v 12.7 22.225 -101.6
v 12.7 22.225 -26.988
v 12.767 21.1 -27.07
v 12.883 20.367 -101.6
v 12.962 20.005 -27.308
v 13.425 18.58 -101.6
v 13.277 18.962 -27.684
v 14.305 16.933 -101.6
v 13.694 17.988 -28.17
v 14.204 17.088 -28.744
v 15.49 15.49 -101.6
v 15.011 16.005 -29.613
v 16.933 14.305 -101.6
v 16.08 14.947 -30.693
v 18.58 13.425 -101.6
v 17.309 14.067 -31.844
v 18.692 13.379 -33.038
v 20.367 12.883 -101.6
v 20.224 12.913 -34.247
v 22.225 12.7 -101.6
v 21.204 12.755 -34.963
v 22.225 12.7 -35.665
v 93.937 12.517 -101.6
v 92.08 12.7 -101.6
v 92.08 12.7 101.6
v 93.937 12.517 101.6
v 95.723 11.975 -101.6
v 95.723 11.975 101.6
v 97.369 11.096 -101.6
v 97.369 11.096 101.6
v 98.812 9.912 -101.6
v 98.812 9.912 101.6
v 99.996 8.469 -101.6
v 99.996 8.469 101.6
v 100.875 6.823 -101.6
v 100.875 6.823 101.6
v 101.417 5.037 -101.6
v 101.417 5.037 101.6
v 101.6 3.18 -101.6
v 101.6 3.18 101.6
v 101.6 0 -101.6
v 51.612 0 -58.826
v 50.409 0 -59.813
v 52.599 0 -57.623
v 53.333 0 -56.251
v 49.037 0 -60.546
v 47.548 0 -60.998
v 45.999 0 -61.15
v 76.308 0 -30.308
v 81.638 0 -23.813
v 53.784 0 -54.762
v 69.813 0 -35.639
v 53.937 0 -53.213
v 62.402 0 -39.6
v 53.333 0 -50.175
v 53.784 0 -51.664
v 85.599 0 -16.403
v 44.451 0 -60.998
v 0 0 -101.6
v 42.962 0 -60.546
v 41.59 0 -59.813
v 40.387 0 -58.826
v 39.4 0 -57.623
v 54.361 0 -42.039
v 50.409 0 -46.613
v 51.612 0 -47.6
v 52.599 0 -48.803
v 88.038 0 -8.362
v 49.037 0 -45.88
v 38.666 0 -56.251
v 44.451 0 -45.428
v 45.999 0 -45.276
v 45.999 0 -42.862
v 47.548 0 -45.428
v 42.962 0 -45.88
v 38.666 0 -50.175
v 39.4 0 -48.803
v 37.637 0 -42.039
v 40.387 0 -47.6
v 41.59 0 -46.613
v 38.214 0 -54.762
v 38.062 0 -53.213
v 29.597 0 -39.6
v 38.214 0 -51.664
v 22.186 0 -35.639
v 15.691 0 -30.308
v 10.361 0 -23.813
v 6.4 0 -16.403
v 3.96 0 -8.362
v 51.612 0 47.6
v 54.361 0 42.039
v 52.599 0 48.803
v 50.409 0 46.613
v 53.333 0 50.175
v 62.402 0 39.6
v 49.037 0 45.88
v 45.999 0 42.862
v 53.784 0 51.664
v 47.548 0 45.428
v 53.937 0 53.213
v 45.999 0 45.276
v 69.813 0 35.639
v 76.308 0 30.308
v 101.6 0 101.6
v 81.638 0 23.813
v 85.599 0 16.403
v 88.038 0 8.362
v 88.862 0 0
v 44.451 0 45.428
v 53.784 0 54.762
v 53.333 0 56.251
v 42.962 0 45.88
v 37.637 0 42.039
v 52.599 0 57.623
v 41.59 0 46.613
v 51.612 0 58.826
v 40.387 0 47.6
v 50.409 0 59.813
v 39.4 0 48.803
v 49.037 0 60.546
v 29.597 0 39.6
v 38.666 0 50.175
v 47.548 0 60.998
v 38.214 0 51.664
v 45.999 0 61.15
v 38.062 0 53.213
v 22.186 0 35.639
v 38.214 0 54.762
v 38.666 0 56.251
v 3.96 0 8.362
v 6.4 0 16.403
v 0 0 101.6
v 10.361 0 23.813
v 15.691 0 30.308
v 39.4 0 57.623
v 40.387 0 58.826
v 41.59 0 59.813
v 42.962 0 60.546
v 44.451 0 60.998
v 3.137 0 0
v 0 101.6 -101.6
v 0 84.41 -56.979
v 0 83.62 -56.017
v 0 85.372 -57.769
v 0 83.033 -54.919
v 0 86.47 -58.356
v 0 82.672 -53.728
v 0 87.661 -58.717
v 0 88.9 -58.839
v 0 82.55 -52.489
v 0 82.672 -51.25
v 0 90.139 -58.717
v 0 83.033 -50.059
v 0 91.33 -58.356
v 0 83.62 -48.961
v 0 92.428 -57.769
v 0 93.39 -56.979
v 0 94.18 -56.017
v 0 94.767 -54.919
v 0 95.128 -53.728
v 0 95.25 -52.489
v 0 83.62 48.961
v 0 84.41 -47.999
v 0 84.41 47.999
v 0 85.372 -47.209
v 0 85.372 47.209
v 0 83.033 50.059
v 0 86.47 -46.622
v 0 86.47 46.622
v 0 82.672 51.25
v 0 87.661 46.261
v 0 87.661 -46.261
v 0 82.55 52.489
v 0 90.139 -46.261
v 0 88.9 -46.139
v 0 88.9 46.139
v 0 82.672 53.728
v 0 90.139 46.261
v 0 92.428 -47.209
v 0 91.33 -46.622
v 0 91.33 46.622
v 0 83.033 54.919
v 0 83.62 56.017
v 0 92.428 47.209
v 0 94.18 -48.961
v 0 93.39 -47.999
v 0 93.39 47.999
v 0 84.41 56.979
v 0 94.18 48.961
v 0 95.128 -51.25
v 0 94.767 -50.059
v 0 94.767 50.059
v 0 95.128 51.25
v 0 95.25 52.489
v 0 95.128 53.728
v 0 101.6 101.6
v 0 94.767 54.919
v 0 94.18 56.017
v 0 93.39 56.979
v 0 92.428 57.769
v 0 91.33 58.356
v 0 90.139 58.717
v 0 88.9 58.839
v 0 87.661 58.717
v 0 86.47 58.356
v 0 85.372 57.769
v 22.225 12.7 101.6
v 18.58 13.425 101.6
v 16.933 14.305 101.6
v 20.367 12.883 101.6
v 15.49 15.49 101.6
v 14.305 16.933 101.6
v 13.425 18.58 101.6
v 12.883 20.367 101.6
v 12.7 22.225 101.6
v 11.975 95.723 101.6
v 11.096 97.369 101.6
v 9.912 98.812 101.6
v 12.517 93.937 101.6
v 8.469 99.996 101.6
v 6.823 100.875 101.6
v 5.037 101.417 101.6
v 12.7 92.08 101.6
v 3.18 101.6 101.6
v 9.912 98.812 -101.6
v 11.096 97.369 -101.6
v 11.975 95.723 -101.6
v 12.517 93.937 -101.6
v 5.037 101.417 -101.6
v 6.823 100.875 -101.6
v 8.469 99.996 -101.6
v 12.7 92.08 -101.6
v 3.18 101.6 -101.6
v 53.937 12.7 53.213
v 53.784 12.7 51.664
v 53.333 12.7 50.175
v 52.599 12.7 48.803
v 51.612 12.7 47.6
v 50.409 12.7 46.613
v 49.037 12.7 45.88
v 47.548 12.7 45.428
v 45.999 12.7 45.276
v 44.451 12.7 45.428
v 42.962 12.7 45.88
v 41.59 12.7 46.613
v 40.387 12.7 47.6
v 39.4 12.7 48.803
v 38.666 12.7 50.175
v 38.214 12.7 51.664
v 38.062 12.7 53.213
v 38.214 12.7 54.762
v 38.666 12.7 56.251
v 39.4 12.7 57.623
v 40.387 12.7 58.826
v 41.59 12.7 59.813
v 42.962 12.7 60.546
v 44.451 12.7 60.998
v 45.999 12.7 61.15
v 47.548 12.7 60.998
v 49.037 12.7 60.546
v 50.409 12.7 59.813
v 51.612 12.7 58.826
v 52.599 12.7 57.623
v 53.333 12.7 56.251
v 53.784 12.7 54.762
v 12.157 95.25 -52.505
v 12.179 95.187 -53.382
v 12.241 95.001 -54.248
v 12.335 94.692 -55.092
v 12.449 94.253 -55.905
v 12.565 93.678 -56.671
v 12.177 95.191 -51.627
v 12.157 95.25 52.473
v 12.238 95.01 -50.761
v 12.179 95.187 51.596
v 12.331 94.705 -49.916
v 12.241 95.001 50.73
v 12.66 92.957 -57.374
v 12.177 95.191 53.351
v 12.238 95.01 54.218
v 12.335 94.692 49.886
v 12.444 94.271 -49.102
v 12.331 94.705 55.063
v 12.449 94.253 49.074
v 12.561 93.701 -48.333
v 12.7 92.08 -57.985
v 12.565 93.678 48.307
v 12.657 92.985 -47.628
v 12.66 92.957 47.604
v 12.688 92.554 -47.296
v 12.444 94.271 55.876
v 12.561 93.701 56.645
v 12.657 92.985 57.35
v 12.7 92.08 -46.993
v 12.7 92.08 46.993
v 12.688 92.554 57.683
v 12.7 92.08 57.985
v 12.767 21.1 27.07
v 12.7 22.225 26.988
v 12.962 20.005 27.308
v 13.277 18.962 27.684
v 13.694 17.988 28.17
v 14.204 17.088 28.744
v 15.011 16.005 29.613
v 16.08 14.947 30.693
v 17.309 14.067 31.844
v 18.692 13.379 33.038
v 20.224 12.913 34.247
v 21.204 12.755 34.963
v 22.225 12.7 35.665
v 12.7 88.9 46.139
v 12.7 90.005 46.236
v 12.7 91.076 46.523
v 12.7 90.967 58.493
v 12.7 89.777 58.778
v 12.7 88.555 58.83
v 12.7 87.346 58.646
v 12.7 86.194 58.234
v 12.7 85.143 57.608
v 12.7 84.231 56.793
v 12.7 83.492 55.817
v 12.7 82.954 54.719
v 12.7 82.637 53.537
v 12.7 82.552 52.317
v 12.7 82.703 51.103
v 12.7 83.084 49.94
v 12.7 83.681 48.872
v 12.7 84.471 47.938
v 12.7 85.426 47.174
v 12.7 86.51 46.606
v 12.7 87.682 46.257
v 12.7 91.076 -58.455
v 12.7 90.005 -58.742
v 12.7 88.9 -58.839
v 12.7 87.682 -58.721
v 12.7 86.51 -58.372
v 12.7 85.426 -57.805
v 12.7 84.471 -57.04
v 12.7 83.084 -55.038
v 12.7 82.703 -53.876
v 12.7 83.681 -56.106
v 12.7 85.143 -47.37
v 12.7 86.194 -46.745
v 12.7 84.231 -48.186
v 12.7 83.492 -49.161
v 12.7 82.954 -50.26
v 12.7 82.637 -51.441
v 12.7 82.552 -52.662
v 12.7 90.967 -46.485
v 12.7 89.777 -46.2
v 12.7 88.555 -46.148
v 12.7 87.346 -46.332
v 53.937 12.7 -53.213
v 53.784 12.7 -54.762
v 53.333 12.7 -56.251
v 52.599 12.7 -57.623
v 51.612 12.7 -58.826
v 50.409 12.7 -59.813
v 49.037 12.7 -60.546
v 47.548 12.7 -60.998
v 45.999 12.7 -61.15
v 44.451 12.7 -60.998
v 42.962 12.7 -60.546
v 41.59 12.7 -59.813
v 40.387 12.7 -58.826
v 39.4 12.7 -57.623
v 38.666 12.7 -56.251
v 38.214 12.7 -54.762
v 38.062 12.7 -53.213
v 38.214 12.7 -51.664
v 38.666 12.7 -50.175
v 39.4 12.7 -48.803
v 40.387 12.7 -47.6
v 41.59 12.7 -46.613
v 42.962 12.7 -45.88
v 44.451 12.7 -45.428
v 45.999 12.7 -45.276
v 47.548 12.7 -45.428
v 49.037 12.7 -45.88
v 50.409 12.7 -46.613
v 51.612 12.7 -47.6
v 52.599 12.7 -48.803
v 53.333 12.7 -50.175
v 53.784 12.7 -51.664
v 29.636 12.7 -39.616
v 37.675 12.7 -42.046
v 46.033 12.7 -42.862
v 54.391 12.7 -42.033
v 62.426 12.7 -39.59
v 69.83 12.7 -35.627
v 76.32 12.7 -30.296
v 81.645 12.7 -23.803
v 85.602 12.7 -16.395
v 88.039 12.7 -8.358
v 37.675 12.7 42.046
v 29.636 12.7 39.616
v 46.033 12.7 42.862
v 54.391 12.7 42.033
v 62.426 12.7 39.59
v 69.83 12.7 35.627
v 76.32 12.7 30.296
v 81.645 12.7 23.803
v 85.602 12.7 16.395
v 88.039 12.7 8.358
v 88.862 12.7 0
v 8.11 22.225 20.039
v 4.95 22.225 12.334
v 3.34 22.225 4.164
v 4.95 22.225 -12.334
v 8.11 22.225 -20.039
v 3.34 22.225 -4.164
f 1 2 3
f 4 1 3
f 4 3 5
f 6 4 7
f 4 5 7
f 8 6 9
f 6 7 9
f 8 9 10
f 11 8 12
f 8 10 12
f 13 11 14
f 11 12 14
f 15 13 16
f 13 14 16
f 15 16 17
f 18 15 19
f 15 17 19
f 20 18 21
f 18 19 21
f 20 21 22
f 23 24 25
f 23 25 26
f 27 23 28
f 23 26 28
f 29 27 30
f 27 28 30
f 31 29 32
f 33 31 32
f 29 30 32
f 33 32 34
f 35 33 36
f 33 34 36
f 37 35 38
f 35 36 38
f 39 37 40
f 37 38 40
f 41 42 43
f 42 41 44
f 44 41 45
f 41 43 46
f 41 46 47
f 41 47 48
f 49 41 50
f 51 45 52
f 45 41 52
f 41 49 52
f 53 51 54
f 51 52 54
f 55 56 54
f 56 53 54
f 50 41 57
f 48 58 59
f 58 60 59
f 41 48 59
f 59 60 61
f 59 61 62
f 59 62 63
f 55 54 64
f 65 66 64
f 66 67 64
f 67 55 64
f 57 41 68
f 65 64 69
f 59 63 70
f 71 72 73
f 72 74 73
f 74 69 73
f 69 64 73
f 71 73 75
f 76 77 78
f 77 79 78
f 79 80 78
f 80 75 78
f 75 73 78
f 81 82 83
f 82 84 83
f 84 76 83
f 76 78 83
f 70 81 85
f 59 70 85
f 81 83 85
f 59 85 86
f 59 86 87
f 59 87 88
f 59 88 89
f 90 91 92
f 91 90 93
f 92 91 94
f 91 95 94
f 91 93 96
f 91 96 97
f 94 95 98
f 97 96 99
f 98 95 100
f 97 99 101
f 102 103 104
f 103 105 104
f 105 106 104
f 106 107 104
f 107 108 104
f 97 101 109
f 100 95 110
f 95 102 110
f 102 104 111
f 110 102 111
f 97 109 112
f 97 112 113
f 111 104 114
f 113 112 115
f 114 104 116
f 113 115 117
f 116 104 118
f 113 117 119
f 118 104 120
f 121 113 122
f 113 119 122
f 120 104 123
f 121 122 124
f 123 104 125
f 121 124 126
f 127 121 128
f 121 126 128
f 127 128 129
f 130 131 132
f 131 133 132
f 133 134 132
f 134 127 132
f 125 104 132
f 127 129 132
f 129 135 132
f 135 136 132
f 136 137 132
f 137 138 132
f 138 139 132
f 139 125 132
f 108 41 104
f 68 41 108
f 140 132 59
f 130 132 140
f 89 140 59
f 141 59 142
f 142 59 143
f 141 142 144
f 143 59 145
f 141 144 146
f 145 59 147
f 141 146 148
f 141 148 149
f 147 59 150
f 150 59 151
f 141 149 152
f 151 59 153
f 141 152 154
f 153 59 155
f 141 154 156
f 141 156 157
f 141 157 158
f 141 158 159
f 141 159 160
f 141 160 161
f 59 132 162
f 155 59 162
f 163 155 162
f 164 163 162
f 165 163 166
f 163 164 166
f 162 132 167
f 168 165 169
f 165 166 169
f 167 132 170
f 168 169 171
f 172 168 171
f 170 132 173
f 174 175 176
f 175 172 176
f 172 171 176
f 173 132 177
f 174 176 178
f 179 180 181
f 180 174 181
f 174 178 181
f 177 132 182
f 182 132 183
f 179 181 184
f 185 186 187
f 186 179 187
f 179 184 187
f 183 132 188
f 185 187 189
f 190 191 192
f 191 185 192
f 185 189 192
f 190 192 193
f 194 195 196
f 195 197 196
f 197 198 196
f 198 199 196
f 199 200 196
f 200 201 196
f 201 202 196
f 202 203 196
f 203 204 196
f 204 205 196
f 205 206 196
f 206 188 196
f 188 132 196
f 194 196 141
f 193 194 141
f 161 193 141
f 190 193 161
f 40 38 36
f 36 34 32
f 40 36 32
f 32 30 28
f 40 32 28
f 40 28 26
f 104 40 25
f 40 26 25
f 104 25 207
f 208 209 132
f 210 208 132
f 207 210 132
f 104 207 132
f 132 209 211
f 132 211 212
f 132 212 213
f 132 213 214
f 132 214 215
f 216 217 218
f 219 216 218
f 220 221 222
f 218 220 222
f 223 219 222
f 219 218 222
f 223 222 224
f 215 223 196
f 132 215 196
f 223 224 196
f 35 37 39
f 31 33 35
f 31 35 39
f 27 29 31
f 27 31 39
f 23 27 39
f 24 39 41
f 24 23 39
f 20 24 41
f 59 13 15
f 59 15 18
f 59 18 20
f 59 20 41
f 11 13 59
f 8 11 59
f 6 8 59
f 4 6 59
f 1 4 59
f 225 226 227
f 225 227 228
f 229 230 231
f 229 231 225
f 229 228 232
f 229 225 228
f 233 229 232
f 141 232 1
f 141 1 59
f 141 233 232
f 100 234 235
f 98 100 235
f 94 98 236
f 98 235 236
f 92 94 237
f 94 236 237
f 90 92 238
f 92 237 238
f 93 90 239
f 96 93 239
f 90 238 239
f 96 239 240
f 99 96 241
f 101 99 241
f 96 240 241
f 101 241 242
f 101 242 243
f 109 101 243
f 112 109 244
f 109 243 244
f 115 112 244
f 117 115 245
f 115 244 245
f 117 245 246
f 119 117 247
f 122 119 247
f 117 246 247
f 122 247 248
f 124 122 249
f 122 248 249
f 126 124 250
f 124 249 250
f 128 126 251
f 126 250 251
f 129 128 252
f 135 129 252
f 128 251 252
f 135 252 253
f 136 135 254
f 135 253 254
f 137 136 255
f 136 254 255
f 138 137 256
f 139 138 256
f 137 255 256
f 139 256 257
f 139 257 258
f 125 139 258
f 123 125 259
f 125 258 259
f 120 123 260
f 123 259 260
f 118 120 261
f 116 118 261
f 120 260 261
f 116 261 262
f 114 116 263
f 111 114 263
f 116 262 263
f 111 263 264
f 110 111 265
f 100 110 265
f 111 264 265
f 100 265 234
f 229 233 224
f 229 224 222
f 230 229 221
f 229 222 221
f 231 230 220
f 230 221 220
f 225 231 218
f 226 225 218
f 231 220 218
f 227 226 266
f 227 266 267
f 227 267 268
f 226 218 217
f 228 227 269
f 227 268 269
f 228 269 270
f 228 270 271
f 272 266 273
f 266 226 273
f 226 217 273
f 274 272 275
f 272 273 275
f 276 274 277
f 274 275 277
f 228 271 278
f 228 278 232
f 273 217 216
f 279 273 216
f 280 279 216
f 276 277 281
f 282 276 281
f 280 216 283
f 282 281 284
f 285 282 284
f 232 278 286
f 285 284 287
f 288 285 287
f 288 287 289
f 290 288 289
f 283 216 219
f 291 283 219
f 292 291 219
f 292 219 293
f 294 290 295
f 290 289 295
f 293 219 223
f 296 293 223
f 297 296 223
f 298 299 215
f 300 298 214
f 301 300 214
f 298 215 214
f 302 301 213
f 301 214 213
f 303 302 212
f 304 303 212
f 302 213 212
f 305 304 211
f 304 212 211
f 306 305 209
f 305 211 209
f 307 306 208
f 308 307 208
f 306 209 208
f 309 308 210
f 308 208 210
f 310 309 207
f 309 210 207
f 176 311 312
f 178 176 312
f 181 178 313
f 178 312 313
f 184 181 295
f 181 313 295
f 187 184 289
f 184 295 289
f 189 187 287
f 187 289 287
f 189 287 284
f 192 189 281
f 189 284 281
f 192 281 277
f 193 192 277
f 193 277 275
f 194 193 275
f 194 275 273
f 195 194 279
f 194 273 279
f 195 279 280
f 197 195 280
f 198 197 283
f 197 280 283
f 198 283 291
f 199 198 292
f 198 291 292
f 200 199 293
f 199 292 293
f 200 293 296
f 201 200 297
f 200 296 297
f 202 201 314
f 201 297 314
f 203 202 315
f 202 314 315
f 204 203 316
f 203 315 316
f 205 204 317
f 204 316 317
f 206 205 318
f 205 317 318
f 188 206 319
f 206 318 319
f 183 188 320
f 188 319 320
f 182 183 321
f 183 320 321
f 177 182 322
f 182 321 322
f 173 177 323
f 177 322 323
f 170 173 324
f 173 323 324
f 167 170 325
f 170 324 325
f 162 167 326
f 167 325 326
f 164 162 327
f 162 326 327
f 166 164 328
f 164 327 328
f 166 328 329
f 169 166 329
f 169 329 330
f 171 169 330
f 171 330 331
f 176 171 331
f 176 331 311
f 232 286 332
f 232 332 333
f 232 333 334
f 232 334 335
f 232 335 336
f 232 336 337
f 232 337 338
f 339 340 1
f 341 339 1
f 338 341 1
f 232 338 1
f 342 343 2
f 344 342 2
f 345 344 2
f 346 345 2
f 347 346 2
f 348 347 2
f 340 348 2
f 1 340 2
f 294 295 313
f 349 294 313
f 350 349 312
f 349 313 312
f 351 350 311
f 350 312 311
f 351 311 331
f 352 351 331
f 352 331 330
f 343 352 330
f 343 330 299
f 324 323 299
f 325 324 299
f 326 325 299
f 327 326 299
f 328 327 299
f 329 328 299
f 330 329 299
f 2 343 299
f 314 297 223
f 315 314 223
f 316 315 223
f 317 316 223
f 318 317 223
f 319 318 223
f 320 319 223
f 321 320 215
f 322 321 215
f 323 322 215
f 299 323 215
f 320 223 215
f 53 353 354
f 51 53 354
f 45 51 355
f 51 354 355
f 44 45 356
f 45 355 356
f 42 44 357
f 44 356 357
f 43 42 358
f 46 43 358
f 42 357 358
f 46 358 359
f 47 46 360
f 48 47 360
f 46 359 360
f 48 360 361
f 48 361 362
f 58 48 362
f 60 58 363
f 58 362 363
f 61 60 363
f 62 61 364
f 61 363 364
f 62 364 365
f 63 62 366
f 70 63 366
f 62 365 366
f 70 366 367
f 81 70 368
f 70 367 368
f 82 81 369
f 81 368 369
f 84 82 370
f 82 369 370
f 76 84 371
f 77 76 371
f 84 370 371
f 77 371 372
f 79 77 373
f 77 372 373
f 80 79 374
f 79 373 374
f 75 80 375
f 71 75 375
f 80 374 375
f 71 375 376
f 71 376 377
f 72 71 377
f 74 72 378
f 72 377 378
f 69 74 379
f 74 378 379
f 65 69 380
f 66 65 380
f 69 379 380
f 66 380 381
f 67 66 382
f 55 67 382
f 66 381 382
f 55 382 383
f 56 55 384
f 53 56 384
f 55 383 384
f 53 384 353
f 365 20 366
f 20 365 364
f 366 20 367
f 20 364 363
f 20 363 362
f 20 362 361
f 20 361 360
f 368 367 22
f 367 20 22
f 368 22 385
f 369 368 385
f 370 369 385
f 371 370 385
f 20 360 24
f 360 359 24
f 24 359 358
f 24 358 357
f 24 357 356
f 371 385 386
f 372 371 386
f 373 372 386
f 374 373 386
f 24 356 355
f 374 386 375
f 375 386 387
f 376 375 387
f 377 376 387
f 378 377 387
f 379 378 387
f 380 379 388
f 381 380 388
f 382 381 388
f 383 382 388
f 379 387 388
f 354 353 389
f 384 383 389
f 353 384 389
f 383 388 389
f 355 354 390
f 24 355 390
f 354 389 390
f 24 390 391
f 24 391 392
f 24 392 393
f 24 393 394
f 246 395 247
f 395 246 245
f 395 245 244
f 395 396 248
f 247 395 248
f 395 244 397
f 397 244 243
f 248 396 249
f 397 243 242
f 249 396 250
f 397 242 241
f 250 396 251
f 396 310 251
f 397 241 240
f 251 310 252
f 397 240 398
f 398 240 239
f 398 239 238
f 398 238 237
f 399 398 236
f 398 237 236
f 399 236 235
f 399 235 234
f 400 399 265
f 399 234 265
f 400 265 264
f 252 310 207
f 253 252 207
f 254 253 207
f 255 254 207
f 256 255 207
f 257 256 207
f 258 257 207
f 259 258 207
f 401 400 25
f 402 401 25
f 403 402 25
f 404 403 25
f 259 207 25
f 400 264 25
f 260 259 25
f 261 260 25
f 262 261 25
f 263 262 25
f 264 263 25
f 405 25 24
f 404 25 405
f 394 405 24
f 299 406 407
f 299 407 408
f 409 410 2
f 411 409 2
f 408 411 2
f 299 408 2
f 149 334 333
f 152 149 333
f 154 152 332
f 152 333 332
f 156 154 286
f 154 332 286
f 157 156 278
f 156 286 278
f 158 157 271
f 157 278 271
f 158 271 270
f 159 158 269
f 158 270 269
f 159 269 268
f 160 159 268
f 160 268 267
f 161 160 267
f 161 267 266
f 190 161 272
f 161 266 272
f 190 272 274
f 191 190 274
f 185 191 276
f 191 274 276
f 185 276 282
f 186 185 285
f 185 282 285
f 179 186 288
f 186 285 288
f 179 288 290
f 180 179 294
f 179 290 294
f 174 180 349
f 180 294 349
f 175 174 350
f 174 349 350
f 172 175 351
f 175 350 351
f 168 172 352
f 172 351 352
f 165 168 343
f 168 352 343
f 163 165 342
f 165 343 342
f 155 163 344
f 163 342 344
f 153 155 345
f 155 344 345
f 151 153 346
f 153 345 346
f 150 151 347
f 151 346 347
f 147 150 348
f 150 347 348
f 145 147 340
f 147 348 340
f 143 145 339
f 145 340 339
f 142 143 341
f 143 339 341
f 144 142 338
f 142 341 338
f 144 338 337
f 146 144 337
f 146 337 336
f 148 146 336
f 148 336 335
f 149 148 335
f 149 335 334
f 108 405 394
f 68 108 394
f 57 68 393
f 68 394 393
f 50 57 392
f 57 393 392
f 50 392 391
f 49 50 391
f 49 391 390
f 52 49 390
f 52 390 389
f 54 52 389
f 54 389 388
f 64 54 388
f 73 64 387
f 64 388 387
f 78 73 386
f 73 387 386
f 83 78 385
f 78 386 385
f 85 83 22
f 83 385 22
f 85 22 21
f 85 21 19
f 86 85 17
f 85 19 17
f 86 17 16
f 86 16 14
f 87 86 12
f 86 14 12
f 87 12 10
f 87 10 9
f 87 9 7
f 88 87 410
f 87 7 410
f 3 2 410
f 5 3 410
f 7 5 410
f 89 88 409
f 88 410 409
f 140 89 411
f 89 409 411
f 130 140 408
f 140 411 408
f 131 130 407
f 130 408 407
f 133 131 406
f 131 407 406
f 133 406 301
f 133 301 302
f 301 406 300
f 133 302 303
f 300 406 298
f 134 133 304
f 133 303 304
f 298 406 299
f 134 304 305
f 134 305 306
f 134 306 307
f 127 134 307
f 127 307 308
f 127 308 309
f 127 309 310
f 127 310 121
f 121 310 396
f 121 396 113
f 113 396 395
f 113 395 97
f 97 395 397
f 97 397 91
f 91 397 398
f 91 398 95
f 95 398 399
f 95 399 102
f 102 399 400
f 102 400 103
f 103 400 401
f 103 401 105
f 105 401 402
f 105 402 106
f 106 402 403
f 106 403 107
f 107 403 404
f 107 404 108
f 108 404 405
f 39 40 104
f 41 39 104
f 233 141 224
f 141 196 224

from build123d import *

# Parameters (mm, degrees)
BOSS_EXTRUDE1_DEPTH     = 101.6
SKETCH2_R               = 7.9375
SKETCH2_R_2             = 42.8625
CUT_EXTRUDE1_DEPTH      = 9.525
CUT_EXTRUDE1_DEPTH_BACK = 12.7
CUT_EXTRUDE2_REACH      = 14.7
SKETCH3_R               = 6.35


with BuildPart() as part:
    # Sketch1 → Boss-Extrude1 (new body, symmetric)
    with BuildSketch(Plane.XY):
        with BuildLine():
            Line((0, 0), (0, 101.6))
            Line((0, 101.6), (3.18008, 101.6))
            ThreePointArc((3.18008, 101.6), (9.911679988, 98.811679988), (12.7, 92.08008))
            Line((12.7, 92.08008), (12.7, 22.225))
            ThreePointArc((12.7, 22.225), (15.489807909, 15.489807909), (22.225, 12.7))
            Line((22.225, 12.7), (92.08008, 12.7))
            ThreePointArc((92.08008, 12.7), (98.811679988, 9.911679988), (101.6, 3.18008))
            Line((101.6, 3.18008), (101.6, 0))
            Line((101.6, 0), (0, 0))
        make_face()
    extrude(amount=BOSS_EXTRUDE1_DEPTH, both=True)

    # Sketch2 → Cut-Extrude1 (cut, two sides)
    with BuildSketch(Plane(origin=(0, 12.7, 0), x_dir=(1, 0, 0), z_dir=(0, 1, 0))) as cut_extrude1_sk:
        with Locations((45.9994, 53.213)):
            Circle(SKETCH2_R)
        with Locations((45.9994, -53.213)):
            Circle(SKETCH2_R)
        with Locations((45.9994, 0)):
            Circle(SKETCH2_R_2)
    extrude(amount=CUT_EXTRUDE1_DEPTH, mode=Mode.SUBTRACT)
    extrude(cut_extrude1_sk.sketch, amount=-CUT_EXTRUDE1_DEPTH_BACK, mode=Mode.SUBTRACT)

    # Sketch3 → Cut-Extrude2 (cut, up to next)
    with BuildSketch(Plane(origin=(12.7, 0, 0), x_dir=(0, 0, -1), z_dir=(1, 0, 0)), mode=Mode.PRIVATE) as cut_extrude2_sk1:
        with Locations((52.4891, 88.9)):
            Circle(SKETCH3_R)
    cut_extrude2_tool1 = extrude(cut_extrude2_sk1.sketch, amount=-CUT_EXTRUDE2_REACH, mode=Mode.PRIVATE) & part.part
    add(cut_extrude2_tool1.solids().sort_by_distance((12.7, 88.9, -52.4891))[0], mode=Mode.SUBTRACT)
    # Sketch3 → Cut-Extrude2 (cut, up to next)
    with BuildSketch(Plane(origin=(12.7, 0, 0), x_dir=(0, 0, -1), z_dir=(1, 0, 0)), mode=Mode.PRIVATE) as cut_extrude2_sk2:
        with Locations((-52.4891, 88.9)):
            Circle(SKETCH3_R)
    cut_extrude2_tool2 = extrude(cut_extrude2_sk2.sketch, amount=-CUT_EXTRUDE2_REACH, mode=Mode.PRIVATE) & part.part
    add(cut_extrude2_tool2.solids().sort_by_distance((12.7, 88.9, 52.4891))[0], mode=Mode.SUBTRACT)


solid = part.part
